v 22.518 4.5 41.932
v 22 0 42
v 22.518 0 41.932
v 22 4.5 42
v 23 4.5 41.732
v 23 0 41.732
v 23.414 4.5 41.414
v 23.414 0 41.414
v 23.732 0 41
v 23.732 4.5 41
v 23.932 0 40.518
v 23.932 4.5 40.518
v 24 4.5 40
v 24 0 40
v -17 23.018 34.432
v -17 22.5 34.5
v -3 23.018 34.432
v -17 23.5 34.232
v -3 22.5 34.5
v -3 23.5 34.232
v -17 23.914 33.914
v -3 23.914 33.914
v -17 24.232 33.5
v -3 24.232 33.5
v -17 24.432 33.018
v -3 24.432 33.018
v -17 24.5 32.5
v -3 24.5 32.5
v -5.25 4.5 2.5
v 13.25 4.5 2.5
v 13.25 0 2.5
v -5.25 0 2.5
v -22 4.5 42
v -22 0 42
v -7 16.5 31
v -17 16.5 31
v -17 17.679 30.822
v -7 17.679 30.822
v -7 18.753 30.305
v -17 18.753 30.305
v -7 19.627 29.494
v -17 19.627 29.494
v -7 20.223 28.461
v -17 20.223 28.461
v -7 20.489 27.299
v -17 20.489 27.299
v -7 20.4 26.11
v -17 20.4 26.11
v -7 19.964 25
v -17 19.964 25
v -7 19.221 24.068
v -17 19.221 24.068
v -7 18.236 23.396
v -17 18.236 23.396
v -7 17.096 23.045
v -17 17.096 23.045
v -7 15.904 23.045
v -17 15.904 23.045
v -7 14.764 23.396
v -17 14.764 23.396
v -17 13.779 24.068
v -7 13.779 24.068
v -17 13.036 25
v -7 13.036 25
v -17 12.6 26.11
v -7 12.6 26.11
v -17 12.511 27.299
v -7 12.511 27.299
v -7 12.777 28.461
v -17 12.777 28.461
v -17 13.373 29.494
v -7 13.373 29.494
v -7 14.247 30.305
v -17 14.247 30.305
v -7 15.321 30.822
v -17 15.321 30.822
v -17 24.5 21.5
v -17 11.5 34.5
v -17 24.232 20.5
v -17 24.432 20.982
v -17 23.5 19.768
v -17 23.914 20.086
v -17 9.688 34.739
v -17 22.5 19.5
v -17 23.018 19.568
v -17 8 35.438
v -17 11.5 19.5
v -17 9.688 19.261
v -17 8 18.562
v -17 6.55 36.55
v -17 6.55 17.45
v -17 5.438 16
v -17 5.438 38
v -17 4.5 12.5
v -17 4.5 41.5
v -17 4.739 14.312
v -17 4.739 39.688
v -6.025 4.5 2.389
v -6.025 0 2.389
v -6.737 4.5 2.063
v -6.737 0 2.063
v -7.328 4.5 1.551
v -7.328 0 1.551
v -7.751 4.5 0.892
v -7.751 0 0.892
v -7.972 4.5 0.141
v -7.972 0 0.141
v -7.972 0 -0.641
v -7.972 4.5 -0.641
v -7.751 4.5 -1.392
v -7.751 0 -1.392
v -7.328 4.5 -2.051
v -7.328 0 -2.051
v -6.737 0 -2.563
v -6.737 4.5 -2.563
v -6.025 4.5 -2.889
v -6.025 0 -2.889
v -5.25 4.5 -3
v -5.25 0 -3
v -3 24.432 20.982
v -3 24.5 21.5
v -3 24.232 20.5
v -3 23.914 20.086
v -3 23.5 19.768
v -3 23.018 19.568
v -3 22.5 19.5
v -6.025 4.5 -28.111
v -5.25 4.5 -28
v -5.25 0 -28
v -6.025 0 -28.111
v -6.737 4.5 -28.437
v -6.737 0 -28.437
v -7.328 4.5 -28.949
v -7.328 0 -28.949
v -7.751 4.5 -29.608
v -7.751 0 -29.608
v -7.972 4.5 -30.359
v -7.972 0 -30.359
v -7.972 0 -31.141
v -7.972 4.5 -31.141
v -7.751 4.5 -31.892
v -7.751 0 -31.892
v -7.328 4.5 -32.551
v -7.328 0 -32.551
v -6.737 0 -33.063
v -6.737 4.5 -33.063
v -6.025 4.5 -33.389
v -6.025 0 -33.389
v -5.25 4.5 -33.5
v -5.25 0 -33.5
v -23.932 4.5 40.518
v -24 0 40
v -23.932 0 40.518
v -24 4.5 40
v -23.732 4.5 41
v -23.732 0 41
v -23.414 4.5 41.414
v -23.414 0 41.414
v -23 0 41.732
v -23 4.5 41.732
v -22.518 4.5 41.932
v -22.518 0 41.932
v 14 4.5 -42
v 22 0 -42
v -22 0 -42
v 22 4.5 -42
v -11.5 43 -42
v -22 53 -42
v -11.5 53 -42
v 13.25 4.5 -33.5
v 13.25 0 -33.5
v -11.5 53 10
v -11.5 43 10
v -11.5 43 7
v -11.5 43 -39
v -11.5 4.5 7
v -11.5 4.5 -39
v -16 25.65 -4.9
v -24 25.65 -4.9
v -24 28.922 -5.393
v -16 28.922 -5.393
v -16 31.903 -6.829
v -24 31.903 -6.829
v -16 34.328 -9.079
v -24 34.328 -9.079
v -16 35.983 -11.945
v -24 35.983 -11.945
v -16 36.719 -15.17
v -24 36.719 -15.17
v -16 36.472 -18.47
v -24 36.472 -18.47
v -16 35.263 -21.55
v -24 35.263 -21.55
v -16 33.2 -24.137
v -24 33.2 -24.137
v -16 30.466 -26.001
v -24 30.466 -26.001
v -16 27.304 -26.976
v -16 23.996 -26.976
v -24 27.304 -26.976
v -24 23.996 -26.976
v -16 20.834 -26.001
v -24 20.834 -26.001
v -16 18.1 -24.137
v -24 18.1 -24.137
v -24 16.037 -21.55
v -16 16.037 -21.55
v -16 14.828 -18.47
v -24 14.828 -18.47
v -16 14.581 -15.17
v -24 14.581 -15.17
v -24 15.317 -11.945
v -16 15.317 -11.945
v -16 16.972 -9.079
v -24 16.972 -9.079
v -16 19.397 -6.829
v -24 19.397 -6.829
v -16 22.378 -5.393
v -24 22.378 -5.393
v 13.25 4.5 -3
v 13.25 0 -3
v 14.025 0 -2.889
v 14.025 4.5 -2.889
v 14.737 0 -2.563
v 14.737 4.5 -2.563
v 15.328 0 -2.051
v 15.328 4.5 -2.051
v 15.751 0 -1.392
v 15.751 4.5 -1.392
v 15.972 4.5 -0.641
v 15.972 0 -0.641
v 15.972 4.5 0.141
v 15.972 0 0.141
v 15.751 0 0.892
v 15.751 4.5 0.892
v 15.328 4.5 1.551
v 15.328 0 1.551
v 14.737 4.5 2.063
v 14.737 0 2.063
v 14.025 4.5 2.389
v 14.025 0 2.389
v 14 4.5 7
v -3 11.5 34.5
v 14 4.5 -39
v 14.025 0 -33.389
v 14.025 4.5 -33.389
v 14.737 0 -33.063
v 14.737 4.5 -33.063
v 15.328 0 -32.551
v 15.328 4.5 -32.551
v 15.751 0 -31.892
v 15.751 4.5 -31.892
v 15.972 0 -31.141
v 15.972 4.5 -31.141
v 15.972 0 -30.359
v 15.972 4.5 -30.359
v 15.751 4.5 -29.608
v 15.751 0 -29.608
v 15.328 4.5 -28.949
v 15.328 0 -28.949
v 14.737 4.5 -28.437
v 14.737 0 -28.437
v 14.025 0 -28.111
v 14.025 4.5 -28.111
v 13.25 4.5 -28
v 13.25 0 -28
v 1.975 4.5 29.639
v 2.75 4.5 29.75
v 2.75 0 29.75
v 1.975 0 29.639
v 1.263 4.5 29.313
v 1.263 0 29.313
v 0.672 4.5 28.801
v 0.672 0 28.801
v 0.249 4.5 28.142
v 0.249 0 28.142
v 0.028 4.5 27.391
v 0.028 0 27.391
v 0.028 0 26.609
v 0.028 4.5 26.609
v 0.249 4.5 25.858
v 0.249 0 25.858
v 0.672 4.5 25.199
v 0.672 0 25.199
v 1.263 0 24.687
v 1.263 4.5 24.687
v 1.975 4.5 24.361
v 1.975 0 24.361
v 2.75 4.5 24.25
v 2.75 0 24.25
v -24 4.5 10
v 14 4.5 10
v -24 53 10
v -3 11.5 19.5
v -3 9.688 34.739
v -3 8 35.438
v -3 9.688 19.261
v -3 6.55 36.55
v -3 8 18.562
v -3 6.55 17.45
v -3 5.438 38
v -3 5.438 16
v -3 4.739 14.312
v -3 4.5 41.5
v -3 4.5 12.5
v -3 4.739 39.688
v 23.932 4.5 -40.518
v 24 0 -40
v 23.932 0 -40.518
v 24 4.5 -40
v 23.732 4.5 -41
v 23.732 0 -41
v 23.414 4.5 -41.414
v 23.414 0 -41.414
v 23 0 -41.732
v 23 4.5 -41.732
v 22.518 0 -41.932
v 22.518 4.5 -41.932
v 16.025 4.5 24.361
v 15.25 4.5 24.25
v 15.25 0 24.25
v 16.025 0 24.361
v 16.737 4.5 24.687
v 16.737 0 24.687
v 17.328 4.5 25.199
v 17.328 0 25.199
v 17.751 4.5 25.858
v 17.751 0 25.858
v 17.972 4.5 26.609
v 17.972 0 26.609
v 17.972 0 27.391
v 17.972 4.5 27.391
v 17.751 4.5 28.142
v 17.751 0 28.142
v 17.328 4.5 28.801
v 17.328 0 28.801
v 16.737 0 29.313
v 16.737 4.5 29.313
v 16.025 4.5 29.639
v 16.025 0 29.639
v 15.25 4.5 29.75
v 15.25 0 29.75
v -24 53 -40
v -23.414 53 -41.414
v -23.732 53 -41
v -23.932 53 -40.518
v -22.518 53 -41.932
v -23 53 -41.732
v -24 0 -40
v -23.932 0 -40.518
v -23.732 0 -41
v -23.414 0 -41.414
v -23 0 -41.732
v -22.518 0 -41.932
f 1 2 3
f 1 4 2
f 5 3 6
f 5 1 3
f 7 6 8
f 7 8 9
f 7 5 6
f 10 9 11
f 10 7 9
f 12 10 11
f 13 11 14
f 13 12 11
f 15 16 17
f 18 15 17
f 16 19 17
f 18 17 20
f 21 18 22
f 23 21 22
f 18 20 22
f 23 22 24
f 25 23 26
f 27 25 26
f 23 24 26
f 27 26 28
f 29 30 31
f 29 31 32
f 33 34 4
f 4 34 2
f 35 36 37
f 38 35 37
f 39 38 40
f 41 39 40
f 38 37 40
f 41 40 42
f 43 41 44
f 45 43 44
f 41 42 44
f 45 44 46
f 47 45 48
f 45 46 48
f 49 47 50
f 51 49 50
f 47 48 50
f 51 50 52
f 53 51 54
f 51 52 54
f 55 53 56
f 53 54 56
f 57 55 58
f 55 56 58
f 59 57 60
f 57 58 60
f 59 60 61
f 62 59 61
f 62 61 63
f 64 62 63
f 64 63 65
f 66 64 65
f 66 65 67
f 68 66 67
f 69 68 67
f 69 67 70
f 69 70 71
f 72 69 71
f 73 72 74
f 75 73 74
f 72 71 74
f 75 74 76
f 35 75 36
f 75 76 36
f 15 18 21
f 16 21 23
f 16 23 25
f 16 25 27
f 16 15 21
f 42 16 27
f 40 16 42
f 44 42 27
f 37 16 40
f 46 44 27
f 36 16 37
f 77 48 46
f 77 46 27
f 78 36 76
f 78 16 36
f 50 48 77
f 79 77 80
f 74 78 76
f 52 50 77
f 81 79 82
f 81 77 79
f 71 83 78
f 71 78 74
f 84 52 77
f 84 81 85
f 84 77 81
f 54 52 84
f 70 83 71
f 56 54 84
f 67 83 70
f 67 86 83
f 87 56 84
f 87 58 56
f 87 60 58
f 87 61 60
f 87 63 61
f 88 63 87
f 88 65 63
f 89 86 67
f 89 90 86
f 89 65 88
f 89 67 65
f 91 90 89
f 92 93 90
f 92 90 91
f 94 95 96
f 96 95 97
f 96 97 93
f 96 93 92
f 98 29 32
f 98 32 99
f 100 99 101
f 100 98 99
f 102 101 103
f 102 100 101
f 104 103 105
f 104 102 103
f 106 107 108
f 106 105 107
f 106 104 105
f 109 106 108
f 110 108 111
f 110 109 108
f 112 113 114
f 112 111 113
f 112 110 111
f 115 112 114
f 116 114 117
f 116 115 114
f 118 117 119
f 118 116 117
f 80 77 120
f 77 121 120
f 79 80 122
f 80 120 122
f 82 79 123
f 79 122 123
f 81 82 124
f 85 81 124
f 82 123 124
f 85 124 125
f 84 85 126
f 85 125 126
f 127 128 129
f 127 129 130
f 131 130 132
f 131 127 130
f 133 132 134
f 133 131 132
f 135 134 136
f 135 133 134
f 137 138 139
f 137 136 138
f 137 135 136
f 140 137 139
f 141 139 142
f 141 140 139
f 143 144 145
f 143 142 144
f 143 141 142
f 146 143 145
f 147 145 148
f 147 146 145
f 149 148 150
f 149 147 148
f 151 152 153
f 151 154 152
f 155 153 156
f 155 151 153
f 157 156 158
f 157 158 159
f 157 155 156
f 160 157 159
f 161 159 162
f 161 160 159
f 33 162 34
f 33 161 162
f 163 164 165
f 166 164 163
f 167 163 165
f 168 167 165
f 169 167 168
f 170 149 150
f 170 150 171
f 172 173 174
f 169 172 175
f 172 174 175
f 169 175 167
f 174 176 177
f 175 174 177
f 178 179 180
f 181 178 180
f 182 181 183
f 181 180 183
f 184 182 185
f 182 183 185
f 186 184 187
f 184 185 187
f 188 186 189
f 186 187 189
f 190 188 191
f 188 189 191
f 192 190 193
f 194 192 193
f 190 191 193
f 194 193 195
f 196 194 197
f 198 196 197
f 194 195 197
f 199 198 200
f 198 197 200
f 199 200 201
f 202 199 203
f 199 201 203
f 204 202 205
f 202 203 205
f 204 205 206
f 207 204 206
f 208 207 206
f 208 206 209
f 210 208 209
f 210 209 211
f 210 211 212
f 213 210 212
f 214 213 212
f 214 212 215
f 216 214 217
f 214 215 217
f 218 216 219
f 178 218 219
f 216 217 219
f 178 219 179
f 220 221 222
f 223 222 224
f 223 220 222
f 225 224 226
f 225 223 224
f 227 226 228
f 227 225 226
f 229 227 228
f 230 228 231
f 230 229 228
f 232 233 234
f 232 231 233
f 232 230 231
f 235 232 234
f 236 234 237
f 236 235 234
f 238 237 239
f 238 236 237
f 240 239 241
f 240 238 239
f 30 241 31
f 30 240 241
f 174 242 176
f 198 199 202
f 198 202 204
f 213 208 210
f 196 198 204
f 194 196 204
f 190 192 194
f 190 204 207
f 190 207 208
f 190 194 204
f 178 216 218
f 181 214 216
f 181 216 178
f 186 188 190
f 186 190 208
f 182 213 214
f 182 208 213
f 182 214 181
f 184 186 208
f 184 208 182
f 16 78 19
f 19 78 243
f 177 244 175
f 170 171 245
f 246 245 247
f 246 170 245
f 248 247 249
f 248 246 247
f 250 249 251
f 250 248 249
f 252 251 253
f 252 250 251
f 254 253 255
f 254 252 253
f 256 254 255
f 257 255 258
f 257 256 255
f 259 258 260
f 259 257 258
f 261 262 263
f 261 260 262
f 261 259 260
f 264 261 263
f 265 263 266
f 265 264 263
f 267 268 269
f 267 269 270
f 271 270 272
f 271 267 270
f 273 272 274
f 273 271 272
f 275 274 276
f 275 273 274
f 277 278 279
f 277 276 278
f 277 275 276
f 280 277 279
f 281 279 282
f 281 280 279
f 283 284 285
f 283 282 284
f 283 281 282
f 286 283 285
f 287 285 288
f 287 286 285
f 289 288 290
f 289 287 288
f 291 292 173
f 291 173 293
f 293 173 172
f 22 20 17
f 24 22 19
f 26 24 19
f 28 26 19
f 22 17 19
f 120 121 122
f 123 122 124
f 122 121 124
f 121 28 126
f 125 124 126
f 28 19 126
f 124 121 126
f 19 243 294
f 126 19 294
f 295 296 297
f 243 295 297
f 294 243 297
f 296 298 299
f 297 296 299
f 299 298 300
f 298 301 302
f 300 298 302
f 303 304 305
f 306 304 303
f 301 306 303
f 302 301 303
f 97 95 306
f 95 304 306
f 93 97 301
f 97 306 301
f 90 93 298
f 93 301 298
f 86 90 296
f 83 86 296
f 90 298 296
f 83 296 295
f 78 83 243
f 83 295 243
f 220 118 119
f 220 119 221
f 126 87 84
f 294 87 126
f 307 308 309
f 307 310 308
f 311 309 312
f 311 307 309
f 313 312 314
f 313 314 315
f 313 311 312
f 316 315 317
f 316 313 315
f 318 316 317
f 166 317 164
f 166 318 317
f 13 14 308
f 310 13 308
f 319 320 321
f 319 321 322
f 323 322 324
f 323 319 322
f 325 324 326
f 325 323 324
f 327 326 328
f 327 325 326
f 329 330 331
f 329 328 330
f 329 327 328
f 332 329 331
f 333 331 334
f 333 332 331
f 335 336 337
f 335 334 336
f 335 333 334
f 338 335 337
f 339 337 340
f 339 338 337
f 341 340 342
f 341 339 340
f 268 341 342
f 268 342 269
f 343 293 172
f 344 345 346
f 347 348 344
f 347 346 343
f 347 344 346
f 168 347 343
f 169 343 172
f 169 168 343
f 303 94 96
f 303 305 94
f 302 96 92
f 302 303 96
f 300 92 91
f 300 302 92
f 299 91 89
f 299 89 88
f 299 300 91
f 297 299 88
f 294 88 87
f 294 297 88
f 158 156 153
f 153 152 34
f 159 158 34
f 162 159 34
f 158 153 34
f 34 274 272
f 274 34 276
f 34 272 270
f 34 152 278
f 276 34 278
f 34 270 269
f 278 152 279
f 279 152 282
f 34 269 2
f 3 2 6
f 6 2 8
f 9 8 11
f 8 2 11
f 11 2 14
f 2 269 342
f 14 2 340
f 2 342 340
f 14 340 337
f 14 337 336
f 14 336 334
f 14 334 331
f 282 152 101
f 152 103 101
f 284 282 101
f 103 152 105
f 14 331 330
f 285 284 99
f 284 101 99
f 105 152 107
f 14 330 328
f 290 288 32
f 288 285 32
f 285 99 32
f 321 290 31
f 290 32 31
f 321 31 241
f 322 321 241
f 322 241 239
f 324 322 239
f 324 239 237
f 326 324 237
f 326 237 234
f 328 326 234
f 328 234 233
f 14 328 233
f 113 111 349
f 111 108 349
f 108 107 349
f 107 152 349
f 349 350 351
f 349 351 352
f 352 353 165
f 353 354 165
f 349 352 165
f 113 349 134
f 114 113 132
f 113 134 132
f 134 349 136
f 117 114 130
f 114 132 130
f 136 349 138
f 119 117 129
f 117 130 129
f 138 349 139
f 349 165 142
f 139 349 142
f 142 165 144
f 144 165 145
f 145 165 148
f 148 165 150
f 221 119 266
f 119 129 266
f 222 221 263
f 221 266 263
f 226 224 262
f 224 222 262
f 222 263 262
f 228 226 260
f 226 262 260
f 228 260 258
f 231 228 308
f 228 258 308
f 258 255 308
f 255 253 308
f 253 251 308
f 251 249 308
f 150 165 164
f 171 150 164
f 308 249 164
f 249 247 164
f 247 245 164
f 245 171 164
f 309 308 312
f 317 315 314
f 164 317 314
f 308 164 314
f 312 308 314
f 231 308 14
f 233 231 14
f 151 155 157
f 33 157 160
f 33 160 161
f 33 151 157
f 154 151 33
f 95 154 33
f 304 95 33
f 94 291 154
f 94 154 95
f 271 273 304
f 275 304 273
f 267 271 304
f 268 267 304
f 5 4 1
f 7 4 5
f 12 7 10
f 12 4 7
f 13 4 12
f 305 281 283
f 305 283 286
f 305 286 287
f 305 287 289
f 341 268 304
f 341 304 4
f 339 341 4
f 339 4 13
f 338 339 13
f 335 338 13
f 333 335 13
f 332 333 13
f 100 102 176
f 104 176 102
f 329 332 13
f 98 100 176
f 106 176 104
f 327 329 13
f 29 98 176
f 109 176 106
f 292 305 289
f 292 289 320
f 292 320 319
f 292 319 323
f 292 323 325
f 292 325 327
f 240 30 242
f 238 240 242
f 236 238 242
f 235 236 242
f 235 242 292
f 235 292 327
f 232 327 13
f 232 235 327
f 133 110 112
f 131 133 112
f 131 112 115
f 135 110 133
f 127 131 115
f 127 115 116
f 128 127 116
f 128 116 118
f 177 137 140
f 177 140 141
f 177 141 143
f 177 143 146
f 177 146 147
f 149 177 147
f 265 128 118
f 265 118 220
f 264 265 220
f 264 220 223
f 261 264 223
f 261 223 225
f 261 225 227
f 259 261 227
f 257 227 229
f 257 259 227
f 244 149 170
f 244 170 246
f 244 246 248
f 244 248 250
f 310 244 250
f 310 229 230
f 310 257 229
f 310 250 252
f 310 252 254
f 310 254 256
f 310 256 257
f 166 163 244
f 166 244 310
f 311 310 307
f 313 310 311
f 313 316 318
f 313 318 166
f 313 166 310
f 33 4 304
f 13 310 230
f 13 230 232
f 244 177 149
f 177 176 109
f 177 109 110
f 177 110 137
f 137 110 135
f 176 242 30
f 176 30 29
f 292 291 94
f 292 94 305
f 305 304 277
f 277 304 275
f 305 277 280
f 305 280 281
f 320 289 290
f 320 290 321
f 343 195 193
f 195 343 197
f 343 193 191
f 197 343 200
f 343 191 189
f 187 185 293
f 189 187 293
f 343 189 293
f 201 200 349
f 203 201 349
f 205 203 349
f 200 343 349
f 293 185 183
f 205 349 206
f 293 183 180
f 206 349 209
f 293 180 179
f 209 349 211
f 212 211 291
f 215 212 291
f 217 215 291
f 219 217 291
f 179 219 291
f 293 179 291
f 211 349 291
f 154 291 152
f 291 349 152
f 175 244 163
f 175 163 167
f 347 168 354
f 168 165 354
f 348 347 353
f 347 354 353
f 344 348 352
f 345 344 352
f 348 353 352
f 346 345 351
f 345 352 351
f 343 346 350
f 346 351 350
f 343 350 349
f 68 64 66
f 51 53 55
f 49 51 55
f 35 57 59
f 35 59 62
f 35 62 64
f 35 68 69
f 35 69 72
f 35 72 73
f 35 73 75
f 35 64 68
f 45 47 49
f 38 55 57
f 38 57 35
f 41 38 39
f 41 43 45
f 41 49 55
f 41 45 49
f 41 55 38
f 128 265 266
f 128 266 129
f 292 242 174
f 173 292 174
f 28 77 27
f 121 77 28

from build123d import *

# Parameters (mm, degrees)
SKETCH1_W           = 48
SKETCH1_H           = 84
BOSS_EXTRUDE1_DEPTH = 4.5
FILLET1_R           = 2
CUT_EXTRUDE1_DEPTH  = 49.582404222
BOSS_EXTRUDE2_DEPTH = 48.5
RIB1_REACH          = 104.181
SKETCH4_WALL_W      = 252.541422716
SKETCH4_WALL_H      = 3
RIB14_REACH         = 80.032
SKETCH5_WALL_W      = 204.243088956
SKETCH5_WALL_H      = 3
SKETCH6_R           = 11.1
CUT_EXTRUDE2_DEPTH  = 8
SKETCH7_W           = 14
SKETCH7_H           = 15
BOSS_EXTRUDE3_DEPTH = 20
FILLET2_R           = 7
FILLET3_R           = 2
SKETCH8_R           = 4
CUT_EXTRUDE3_DEPTH  = 10
CUT_EXTRUDE4_DEPTH  = 69.5


with BuildPart() as part:
    # Sketch1 → Boss-Extrude1 (new body)
    with BuildSketch(Plane(origin=(0, 0, 0), x_dir=(1, 0, 0), z_dir=(0, 1, 0))):
        Rectangle(SKETCH1_W, SKETCH1_H)
    extrude(amount=BOSS_EXTRUDE1_DEPTH)

    # Fillet1
    fillet1_edges = [part.edges().sort_by_distance(p)[0] for p in [
        (-24, 2.25, -42),
        (24, 2.25, -42),
        (24, 2.25, 42),
        (-24, 2.25, 42),
    ]]
    fillet(fillet1_edges, radius=FILLET1_R)

    # Sketch2 → Cut-Extrude1 (cut, through all)
    with BuildSketch(Plane(origin=(0, 4.5, 0), x_dir=(1, 0, 0), z_dir=(0, 1, 0))):
        with BuildLine():
            Line((-5.25, 33.5), (13.25, 33.5))
            ThreePointArc((13.25, 33.5), (16, 30.750000115), (13.25000023, 28))
            Line((13.25000023, 28), (-5.25, 28))
            ThreePointArc((-5.25, 28), (-8, 30.75), (-5.25, 33.5))
        make_face()
        with BuildLine():
            Line((-5.25, 3), (13.25000023, 3))
            ThreePointArc((13.25000023, 3), (16, 0.249999885), (13.25, -2.5))
            Line((13.25, -2.5), (-5.25, -2.5))
            ThreePointArc((-5.25, -2.5), (-8, 0.25), (-5.25, 3))
        make_face()
    extrude(amount=-CUT_EXTRUDE1_DEPTH, mode=Mode.SUBTRACT)

    # Sketch3 → Boss-Extrude2 (add)
    with BuildSketch(Plane(origin=(0, 4.5, 0), x_dir=(1, 0, 0), z_dir=(0, 1, 0))):
        with BuildLine():
            Line((-11.5, 42), (-22, 42))
            ThreePointArc((-22, 42), (-23.414213562, 41.414213562), (-24, 40))
            Line((-24, 40), (-24, -10))
            Line((-24, -10), (-11.5, -10))
            Line((-11.5, -10), (-11.5, 42))
        make_face()
    extrude(amount=BOSS_EXTRUDE2_DEPTH)

    # Sketch4 wall → Rib1 (add, up to next)
    with BuildSketch(Plane(origin=(1.25, 23.75, -42), x_dir=(-0.552199056825, 0.833712301481, 0), z_dir=(0.833712301481, 0.552199056825, 0)), mode=Mode.PRIVATE) as rib1_sk1:
        with Locations((0, 1.5)):
            Rectangle(SKETCH4_WALL_W, SKETCH4_WALL_H)
    rib1_tool1 = extrude(rib1_sk1.sketch, amount=-RIB1_REACH, mode=Mode.PRIVATE) - part.part
    add(rib1_tool1.solids().sort_by_distance((1.25, 23.75, -42))[0])

    # Sketch5 wall → Rib14 (add, up to next)
    with BuildSketch(Plane(origin=(1.25, 23.75, 10), x_dir=(-0.552199056825, 0.833712301481, 0), z_dir=(-0.833712301481, -0.552199056825, 0)), mode=Mode.PRIVATE) as rib14_sk1:
        with Locations((0, 1.5)):
            Rectangle(SKETCH5_WALL_W, SKETCH5_WALL_H)
    rib14_tool1 = extrude(rib14_sk1.sketch, amount=RIB14_REACH, mode=Mode.PRIVATE) - part.part
    add(rib14_tool1.solids().sort_by_distance((1.25, 23.75, 10))[0])

    # Sketch6 → Cut-Extrude2 (cut)
    with BuildSketch(Plane.ZY.offset(24)):
        with Locations((-16, 25.65)):
            Circle(SKETCH6_R)
    extrude(amount=-CUT_EXTRUDE2_DEPTH, mode=Mode.SUBTRACT)

    # Sketch7 → Boss-Extrude3 (add)
    with BuildSketch(Plane(origin=(0, 4.5, 0), x_dir=(1, 0, 0), z_dir=(0, 1, 0))):
        with Locations((-10, -27)):
            Rectangle(SKETCH7_W, SKETCH7_H)
    extrude(amount=BOSS_EXTRUDE3_DEPTH)

    # Fillet2
    fillet2_edges = [part.edges().sort_by_distance(p)[0] for p in [
        (-10, 4.5, 34.5),
        (-10, 4.5, 19.5),
    ]]
    fillet(fillet2_edges, radius=FILLET2_R)

    # Fillet3
    fillet3_edges = [part.edges().sort_by_distance(p)[0] for p in [
        (-10, 24.5, 34.5),
        (-10, 24.5, 19.5),
    ]]
    fillet(fillet3_edges, radius=FILLET3_R)

    # Sketch8 → Cut-Extrude3 (cut)
    with BuildSketch(Plane.ZY.offset(17)):
        with Locations((27, 16.5)):
            Circle(SKETCH8_R)
    extrude(amount=-CUT_EXTRUDE3_DEPTH, mode=Mode.SUBTRACT)

    # Sketch9 → Cut-Extrude4 (cut, through all)
    with BuildSketch(Plane(origin=(0, 4.5, 0), x_dir=(1, 0, 0), z_dir=(0, 1, 0))):
        with BuildLine():
            Line((2.75, -24.25), (15.25, -24.25))
            ThreePointArc((15.25, -24.25), (18, -27), (15.25, -29.75))
            Line((15.25, -29.75), (2.75, -29.75))
            ThreePointArc((2.75, -29.75), (0, -27), (2.75, -24.25))
        make_face()
    extrude(amount=-CUT_EXTRUDE4_DEPTH, mode=Mode.SUBTRACT)


solid = part.part
